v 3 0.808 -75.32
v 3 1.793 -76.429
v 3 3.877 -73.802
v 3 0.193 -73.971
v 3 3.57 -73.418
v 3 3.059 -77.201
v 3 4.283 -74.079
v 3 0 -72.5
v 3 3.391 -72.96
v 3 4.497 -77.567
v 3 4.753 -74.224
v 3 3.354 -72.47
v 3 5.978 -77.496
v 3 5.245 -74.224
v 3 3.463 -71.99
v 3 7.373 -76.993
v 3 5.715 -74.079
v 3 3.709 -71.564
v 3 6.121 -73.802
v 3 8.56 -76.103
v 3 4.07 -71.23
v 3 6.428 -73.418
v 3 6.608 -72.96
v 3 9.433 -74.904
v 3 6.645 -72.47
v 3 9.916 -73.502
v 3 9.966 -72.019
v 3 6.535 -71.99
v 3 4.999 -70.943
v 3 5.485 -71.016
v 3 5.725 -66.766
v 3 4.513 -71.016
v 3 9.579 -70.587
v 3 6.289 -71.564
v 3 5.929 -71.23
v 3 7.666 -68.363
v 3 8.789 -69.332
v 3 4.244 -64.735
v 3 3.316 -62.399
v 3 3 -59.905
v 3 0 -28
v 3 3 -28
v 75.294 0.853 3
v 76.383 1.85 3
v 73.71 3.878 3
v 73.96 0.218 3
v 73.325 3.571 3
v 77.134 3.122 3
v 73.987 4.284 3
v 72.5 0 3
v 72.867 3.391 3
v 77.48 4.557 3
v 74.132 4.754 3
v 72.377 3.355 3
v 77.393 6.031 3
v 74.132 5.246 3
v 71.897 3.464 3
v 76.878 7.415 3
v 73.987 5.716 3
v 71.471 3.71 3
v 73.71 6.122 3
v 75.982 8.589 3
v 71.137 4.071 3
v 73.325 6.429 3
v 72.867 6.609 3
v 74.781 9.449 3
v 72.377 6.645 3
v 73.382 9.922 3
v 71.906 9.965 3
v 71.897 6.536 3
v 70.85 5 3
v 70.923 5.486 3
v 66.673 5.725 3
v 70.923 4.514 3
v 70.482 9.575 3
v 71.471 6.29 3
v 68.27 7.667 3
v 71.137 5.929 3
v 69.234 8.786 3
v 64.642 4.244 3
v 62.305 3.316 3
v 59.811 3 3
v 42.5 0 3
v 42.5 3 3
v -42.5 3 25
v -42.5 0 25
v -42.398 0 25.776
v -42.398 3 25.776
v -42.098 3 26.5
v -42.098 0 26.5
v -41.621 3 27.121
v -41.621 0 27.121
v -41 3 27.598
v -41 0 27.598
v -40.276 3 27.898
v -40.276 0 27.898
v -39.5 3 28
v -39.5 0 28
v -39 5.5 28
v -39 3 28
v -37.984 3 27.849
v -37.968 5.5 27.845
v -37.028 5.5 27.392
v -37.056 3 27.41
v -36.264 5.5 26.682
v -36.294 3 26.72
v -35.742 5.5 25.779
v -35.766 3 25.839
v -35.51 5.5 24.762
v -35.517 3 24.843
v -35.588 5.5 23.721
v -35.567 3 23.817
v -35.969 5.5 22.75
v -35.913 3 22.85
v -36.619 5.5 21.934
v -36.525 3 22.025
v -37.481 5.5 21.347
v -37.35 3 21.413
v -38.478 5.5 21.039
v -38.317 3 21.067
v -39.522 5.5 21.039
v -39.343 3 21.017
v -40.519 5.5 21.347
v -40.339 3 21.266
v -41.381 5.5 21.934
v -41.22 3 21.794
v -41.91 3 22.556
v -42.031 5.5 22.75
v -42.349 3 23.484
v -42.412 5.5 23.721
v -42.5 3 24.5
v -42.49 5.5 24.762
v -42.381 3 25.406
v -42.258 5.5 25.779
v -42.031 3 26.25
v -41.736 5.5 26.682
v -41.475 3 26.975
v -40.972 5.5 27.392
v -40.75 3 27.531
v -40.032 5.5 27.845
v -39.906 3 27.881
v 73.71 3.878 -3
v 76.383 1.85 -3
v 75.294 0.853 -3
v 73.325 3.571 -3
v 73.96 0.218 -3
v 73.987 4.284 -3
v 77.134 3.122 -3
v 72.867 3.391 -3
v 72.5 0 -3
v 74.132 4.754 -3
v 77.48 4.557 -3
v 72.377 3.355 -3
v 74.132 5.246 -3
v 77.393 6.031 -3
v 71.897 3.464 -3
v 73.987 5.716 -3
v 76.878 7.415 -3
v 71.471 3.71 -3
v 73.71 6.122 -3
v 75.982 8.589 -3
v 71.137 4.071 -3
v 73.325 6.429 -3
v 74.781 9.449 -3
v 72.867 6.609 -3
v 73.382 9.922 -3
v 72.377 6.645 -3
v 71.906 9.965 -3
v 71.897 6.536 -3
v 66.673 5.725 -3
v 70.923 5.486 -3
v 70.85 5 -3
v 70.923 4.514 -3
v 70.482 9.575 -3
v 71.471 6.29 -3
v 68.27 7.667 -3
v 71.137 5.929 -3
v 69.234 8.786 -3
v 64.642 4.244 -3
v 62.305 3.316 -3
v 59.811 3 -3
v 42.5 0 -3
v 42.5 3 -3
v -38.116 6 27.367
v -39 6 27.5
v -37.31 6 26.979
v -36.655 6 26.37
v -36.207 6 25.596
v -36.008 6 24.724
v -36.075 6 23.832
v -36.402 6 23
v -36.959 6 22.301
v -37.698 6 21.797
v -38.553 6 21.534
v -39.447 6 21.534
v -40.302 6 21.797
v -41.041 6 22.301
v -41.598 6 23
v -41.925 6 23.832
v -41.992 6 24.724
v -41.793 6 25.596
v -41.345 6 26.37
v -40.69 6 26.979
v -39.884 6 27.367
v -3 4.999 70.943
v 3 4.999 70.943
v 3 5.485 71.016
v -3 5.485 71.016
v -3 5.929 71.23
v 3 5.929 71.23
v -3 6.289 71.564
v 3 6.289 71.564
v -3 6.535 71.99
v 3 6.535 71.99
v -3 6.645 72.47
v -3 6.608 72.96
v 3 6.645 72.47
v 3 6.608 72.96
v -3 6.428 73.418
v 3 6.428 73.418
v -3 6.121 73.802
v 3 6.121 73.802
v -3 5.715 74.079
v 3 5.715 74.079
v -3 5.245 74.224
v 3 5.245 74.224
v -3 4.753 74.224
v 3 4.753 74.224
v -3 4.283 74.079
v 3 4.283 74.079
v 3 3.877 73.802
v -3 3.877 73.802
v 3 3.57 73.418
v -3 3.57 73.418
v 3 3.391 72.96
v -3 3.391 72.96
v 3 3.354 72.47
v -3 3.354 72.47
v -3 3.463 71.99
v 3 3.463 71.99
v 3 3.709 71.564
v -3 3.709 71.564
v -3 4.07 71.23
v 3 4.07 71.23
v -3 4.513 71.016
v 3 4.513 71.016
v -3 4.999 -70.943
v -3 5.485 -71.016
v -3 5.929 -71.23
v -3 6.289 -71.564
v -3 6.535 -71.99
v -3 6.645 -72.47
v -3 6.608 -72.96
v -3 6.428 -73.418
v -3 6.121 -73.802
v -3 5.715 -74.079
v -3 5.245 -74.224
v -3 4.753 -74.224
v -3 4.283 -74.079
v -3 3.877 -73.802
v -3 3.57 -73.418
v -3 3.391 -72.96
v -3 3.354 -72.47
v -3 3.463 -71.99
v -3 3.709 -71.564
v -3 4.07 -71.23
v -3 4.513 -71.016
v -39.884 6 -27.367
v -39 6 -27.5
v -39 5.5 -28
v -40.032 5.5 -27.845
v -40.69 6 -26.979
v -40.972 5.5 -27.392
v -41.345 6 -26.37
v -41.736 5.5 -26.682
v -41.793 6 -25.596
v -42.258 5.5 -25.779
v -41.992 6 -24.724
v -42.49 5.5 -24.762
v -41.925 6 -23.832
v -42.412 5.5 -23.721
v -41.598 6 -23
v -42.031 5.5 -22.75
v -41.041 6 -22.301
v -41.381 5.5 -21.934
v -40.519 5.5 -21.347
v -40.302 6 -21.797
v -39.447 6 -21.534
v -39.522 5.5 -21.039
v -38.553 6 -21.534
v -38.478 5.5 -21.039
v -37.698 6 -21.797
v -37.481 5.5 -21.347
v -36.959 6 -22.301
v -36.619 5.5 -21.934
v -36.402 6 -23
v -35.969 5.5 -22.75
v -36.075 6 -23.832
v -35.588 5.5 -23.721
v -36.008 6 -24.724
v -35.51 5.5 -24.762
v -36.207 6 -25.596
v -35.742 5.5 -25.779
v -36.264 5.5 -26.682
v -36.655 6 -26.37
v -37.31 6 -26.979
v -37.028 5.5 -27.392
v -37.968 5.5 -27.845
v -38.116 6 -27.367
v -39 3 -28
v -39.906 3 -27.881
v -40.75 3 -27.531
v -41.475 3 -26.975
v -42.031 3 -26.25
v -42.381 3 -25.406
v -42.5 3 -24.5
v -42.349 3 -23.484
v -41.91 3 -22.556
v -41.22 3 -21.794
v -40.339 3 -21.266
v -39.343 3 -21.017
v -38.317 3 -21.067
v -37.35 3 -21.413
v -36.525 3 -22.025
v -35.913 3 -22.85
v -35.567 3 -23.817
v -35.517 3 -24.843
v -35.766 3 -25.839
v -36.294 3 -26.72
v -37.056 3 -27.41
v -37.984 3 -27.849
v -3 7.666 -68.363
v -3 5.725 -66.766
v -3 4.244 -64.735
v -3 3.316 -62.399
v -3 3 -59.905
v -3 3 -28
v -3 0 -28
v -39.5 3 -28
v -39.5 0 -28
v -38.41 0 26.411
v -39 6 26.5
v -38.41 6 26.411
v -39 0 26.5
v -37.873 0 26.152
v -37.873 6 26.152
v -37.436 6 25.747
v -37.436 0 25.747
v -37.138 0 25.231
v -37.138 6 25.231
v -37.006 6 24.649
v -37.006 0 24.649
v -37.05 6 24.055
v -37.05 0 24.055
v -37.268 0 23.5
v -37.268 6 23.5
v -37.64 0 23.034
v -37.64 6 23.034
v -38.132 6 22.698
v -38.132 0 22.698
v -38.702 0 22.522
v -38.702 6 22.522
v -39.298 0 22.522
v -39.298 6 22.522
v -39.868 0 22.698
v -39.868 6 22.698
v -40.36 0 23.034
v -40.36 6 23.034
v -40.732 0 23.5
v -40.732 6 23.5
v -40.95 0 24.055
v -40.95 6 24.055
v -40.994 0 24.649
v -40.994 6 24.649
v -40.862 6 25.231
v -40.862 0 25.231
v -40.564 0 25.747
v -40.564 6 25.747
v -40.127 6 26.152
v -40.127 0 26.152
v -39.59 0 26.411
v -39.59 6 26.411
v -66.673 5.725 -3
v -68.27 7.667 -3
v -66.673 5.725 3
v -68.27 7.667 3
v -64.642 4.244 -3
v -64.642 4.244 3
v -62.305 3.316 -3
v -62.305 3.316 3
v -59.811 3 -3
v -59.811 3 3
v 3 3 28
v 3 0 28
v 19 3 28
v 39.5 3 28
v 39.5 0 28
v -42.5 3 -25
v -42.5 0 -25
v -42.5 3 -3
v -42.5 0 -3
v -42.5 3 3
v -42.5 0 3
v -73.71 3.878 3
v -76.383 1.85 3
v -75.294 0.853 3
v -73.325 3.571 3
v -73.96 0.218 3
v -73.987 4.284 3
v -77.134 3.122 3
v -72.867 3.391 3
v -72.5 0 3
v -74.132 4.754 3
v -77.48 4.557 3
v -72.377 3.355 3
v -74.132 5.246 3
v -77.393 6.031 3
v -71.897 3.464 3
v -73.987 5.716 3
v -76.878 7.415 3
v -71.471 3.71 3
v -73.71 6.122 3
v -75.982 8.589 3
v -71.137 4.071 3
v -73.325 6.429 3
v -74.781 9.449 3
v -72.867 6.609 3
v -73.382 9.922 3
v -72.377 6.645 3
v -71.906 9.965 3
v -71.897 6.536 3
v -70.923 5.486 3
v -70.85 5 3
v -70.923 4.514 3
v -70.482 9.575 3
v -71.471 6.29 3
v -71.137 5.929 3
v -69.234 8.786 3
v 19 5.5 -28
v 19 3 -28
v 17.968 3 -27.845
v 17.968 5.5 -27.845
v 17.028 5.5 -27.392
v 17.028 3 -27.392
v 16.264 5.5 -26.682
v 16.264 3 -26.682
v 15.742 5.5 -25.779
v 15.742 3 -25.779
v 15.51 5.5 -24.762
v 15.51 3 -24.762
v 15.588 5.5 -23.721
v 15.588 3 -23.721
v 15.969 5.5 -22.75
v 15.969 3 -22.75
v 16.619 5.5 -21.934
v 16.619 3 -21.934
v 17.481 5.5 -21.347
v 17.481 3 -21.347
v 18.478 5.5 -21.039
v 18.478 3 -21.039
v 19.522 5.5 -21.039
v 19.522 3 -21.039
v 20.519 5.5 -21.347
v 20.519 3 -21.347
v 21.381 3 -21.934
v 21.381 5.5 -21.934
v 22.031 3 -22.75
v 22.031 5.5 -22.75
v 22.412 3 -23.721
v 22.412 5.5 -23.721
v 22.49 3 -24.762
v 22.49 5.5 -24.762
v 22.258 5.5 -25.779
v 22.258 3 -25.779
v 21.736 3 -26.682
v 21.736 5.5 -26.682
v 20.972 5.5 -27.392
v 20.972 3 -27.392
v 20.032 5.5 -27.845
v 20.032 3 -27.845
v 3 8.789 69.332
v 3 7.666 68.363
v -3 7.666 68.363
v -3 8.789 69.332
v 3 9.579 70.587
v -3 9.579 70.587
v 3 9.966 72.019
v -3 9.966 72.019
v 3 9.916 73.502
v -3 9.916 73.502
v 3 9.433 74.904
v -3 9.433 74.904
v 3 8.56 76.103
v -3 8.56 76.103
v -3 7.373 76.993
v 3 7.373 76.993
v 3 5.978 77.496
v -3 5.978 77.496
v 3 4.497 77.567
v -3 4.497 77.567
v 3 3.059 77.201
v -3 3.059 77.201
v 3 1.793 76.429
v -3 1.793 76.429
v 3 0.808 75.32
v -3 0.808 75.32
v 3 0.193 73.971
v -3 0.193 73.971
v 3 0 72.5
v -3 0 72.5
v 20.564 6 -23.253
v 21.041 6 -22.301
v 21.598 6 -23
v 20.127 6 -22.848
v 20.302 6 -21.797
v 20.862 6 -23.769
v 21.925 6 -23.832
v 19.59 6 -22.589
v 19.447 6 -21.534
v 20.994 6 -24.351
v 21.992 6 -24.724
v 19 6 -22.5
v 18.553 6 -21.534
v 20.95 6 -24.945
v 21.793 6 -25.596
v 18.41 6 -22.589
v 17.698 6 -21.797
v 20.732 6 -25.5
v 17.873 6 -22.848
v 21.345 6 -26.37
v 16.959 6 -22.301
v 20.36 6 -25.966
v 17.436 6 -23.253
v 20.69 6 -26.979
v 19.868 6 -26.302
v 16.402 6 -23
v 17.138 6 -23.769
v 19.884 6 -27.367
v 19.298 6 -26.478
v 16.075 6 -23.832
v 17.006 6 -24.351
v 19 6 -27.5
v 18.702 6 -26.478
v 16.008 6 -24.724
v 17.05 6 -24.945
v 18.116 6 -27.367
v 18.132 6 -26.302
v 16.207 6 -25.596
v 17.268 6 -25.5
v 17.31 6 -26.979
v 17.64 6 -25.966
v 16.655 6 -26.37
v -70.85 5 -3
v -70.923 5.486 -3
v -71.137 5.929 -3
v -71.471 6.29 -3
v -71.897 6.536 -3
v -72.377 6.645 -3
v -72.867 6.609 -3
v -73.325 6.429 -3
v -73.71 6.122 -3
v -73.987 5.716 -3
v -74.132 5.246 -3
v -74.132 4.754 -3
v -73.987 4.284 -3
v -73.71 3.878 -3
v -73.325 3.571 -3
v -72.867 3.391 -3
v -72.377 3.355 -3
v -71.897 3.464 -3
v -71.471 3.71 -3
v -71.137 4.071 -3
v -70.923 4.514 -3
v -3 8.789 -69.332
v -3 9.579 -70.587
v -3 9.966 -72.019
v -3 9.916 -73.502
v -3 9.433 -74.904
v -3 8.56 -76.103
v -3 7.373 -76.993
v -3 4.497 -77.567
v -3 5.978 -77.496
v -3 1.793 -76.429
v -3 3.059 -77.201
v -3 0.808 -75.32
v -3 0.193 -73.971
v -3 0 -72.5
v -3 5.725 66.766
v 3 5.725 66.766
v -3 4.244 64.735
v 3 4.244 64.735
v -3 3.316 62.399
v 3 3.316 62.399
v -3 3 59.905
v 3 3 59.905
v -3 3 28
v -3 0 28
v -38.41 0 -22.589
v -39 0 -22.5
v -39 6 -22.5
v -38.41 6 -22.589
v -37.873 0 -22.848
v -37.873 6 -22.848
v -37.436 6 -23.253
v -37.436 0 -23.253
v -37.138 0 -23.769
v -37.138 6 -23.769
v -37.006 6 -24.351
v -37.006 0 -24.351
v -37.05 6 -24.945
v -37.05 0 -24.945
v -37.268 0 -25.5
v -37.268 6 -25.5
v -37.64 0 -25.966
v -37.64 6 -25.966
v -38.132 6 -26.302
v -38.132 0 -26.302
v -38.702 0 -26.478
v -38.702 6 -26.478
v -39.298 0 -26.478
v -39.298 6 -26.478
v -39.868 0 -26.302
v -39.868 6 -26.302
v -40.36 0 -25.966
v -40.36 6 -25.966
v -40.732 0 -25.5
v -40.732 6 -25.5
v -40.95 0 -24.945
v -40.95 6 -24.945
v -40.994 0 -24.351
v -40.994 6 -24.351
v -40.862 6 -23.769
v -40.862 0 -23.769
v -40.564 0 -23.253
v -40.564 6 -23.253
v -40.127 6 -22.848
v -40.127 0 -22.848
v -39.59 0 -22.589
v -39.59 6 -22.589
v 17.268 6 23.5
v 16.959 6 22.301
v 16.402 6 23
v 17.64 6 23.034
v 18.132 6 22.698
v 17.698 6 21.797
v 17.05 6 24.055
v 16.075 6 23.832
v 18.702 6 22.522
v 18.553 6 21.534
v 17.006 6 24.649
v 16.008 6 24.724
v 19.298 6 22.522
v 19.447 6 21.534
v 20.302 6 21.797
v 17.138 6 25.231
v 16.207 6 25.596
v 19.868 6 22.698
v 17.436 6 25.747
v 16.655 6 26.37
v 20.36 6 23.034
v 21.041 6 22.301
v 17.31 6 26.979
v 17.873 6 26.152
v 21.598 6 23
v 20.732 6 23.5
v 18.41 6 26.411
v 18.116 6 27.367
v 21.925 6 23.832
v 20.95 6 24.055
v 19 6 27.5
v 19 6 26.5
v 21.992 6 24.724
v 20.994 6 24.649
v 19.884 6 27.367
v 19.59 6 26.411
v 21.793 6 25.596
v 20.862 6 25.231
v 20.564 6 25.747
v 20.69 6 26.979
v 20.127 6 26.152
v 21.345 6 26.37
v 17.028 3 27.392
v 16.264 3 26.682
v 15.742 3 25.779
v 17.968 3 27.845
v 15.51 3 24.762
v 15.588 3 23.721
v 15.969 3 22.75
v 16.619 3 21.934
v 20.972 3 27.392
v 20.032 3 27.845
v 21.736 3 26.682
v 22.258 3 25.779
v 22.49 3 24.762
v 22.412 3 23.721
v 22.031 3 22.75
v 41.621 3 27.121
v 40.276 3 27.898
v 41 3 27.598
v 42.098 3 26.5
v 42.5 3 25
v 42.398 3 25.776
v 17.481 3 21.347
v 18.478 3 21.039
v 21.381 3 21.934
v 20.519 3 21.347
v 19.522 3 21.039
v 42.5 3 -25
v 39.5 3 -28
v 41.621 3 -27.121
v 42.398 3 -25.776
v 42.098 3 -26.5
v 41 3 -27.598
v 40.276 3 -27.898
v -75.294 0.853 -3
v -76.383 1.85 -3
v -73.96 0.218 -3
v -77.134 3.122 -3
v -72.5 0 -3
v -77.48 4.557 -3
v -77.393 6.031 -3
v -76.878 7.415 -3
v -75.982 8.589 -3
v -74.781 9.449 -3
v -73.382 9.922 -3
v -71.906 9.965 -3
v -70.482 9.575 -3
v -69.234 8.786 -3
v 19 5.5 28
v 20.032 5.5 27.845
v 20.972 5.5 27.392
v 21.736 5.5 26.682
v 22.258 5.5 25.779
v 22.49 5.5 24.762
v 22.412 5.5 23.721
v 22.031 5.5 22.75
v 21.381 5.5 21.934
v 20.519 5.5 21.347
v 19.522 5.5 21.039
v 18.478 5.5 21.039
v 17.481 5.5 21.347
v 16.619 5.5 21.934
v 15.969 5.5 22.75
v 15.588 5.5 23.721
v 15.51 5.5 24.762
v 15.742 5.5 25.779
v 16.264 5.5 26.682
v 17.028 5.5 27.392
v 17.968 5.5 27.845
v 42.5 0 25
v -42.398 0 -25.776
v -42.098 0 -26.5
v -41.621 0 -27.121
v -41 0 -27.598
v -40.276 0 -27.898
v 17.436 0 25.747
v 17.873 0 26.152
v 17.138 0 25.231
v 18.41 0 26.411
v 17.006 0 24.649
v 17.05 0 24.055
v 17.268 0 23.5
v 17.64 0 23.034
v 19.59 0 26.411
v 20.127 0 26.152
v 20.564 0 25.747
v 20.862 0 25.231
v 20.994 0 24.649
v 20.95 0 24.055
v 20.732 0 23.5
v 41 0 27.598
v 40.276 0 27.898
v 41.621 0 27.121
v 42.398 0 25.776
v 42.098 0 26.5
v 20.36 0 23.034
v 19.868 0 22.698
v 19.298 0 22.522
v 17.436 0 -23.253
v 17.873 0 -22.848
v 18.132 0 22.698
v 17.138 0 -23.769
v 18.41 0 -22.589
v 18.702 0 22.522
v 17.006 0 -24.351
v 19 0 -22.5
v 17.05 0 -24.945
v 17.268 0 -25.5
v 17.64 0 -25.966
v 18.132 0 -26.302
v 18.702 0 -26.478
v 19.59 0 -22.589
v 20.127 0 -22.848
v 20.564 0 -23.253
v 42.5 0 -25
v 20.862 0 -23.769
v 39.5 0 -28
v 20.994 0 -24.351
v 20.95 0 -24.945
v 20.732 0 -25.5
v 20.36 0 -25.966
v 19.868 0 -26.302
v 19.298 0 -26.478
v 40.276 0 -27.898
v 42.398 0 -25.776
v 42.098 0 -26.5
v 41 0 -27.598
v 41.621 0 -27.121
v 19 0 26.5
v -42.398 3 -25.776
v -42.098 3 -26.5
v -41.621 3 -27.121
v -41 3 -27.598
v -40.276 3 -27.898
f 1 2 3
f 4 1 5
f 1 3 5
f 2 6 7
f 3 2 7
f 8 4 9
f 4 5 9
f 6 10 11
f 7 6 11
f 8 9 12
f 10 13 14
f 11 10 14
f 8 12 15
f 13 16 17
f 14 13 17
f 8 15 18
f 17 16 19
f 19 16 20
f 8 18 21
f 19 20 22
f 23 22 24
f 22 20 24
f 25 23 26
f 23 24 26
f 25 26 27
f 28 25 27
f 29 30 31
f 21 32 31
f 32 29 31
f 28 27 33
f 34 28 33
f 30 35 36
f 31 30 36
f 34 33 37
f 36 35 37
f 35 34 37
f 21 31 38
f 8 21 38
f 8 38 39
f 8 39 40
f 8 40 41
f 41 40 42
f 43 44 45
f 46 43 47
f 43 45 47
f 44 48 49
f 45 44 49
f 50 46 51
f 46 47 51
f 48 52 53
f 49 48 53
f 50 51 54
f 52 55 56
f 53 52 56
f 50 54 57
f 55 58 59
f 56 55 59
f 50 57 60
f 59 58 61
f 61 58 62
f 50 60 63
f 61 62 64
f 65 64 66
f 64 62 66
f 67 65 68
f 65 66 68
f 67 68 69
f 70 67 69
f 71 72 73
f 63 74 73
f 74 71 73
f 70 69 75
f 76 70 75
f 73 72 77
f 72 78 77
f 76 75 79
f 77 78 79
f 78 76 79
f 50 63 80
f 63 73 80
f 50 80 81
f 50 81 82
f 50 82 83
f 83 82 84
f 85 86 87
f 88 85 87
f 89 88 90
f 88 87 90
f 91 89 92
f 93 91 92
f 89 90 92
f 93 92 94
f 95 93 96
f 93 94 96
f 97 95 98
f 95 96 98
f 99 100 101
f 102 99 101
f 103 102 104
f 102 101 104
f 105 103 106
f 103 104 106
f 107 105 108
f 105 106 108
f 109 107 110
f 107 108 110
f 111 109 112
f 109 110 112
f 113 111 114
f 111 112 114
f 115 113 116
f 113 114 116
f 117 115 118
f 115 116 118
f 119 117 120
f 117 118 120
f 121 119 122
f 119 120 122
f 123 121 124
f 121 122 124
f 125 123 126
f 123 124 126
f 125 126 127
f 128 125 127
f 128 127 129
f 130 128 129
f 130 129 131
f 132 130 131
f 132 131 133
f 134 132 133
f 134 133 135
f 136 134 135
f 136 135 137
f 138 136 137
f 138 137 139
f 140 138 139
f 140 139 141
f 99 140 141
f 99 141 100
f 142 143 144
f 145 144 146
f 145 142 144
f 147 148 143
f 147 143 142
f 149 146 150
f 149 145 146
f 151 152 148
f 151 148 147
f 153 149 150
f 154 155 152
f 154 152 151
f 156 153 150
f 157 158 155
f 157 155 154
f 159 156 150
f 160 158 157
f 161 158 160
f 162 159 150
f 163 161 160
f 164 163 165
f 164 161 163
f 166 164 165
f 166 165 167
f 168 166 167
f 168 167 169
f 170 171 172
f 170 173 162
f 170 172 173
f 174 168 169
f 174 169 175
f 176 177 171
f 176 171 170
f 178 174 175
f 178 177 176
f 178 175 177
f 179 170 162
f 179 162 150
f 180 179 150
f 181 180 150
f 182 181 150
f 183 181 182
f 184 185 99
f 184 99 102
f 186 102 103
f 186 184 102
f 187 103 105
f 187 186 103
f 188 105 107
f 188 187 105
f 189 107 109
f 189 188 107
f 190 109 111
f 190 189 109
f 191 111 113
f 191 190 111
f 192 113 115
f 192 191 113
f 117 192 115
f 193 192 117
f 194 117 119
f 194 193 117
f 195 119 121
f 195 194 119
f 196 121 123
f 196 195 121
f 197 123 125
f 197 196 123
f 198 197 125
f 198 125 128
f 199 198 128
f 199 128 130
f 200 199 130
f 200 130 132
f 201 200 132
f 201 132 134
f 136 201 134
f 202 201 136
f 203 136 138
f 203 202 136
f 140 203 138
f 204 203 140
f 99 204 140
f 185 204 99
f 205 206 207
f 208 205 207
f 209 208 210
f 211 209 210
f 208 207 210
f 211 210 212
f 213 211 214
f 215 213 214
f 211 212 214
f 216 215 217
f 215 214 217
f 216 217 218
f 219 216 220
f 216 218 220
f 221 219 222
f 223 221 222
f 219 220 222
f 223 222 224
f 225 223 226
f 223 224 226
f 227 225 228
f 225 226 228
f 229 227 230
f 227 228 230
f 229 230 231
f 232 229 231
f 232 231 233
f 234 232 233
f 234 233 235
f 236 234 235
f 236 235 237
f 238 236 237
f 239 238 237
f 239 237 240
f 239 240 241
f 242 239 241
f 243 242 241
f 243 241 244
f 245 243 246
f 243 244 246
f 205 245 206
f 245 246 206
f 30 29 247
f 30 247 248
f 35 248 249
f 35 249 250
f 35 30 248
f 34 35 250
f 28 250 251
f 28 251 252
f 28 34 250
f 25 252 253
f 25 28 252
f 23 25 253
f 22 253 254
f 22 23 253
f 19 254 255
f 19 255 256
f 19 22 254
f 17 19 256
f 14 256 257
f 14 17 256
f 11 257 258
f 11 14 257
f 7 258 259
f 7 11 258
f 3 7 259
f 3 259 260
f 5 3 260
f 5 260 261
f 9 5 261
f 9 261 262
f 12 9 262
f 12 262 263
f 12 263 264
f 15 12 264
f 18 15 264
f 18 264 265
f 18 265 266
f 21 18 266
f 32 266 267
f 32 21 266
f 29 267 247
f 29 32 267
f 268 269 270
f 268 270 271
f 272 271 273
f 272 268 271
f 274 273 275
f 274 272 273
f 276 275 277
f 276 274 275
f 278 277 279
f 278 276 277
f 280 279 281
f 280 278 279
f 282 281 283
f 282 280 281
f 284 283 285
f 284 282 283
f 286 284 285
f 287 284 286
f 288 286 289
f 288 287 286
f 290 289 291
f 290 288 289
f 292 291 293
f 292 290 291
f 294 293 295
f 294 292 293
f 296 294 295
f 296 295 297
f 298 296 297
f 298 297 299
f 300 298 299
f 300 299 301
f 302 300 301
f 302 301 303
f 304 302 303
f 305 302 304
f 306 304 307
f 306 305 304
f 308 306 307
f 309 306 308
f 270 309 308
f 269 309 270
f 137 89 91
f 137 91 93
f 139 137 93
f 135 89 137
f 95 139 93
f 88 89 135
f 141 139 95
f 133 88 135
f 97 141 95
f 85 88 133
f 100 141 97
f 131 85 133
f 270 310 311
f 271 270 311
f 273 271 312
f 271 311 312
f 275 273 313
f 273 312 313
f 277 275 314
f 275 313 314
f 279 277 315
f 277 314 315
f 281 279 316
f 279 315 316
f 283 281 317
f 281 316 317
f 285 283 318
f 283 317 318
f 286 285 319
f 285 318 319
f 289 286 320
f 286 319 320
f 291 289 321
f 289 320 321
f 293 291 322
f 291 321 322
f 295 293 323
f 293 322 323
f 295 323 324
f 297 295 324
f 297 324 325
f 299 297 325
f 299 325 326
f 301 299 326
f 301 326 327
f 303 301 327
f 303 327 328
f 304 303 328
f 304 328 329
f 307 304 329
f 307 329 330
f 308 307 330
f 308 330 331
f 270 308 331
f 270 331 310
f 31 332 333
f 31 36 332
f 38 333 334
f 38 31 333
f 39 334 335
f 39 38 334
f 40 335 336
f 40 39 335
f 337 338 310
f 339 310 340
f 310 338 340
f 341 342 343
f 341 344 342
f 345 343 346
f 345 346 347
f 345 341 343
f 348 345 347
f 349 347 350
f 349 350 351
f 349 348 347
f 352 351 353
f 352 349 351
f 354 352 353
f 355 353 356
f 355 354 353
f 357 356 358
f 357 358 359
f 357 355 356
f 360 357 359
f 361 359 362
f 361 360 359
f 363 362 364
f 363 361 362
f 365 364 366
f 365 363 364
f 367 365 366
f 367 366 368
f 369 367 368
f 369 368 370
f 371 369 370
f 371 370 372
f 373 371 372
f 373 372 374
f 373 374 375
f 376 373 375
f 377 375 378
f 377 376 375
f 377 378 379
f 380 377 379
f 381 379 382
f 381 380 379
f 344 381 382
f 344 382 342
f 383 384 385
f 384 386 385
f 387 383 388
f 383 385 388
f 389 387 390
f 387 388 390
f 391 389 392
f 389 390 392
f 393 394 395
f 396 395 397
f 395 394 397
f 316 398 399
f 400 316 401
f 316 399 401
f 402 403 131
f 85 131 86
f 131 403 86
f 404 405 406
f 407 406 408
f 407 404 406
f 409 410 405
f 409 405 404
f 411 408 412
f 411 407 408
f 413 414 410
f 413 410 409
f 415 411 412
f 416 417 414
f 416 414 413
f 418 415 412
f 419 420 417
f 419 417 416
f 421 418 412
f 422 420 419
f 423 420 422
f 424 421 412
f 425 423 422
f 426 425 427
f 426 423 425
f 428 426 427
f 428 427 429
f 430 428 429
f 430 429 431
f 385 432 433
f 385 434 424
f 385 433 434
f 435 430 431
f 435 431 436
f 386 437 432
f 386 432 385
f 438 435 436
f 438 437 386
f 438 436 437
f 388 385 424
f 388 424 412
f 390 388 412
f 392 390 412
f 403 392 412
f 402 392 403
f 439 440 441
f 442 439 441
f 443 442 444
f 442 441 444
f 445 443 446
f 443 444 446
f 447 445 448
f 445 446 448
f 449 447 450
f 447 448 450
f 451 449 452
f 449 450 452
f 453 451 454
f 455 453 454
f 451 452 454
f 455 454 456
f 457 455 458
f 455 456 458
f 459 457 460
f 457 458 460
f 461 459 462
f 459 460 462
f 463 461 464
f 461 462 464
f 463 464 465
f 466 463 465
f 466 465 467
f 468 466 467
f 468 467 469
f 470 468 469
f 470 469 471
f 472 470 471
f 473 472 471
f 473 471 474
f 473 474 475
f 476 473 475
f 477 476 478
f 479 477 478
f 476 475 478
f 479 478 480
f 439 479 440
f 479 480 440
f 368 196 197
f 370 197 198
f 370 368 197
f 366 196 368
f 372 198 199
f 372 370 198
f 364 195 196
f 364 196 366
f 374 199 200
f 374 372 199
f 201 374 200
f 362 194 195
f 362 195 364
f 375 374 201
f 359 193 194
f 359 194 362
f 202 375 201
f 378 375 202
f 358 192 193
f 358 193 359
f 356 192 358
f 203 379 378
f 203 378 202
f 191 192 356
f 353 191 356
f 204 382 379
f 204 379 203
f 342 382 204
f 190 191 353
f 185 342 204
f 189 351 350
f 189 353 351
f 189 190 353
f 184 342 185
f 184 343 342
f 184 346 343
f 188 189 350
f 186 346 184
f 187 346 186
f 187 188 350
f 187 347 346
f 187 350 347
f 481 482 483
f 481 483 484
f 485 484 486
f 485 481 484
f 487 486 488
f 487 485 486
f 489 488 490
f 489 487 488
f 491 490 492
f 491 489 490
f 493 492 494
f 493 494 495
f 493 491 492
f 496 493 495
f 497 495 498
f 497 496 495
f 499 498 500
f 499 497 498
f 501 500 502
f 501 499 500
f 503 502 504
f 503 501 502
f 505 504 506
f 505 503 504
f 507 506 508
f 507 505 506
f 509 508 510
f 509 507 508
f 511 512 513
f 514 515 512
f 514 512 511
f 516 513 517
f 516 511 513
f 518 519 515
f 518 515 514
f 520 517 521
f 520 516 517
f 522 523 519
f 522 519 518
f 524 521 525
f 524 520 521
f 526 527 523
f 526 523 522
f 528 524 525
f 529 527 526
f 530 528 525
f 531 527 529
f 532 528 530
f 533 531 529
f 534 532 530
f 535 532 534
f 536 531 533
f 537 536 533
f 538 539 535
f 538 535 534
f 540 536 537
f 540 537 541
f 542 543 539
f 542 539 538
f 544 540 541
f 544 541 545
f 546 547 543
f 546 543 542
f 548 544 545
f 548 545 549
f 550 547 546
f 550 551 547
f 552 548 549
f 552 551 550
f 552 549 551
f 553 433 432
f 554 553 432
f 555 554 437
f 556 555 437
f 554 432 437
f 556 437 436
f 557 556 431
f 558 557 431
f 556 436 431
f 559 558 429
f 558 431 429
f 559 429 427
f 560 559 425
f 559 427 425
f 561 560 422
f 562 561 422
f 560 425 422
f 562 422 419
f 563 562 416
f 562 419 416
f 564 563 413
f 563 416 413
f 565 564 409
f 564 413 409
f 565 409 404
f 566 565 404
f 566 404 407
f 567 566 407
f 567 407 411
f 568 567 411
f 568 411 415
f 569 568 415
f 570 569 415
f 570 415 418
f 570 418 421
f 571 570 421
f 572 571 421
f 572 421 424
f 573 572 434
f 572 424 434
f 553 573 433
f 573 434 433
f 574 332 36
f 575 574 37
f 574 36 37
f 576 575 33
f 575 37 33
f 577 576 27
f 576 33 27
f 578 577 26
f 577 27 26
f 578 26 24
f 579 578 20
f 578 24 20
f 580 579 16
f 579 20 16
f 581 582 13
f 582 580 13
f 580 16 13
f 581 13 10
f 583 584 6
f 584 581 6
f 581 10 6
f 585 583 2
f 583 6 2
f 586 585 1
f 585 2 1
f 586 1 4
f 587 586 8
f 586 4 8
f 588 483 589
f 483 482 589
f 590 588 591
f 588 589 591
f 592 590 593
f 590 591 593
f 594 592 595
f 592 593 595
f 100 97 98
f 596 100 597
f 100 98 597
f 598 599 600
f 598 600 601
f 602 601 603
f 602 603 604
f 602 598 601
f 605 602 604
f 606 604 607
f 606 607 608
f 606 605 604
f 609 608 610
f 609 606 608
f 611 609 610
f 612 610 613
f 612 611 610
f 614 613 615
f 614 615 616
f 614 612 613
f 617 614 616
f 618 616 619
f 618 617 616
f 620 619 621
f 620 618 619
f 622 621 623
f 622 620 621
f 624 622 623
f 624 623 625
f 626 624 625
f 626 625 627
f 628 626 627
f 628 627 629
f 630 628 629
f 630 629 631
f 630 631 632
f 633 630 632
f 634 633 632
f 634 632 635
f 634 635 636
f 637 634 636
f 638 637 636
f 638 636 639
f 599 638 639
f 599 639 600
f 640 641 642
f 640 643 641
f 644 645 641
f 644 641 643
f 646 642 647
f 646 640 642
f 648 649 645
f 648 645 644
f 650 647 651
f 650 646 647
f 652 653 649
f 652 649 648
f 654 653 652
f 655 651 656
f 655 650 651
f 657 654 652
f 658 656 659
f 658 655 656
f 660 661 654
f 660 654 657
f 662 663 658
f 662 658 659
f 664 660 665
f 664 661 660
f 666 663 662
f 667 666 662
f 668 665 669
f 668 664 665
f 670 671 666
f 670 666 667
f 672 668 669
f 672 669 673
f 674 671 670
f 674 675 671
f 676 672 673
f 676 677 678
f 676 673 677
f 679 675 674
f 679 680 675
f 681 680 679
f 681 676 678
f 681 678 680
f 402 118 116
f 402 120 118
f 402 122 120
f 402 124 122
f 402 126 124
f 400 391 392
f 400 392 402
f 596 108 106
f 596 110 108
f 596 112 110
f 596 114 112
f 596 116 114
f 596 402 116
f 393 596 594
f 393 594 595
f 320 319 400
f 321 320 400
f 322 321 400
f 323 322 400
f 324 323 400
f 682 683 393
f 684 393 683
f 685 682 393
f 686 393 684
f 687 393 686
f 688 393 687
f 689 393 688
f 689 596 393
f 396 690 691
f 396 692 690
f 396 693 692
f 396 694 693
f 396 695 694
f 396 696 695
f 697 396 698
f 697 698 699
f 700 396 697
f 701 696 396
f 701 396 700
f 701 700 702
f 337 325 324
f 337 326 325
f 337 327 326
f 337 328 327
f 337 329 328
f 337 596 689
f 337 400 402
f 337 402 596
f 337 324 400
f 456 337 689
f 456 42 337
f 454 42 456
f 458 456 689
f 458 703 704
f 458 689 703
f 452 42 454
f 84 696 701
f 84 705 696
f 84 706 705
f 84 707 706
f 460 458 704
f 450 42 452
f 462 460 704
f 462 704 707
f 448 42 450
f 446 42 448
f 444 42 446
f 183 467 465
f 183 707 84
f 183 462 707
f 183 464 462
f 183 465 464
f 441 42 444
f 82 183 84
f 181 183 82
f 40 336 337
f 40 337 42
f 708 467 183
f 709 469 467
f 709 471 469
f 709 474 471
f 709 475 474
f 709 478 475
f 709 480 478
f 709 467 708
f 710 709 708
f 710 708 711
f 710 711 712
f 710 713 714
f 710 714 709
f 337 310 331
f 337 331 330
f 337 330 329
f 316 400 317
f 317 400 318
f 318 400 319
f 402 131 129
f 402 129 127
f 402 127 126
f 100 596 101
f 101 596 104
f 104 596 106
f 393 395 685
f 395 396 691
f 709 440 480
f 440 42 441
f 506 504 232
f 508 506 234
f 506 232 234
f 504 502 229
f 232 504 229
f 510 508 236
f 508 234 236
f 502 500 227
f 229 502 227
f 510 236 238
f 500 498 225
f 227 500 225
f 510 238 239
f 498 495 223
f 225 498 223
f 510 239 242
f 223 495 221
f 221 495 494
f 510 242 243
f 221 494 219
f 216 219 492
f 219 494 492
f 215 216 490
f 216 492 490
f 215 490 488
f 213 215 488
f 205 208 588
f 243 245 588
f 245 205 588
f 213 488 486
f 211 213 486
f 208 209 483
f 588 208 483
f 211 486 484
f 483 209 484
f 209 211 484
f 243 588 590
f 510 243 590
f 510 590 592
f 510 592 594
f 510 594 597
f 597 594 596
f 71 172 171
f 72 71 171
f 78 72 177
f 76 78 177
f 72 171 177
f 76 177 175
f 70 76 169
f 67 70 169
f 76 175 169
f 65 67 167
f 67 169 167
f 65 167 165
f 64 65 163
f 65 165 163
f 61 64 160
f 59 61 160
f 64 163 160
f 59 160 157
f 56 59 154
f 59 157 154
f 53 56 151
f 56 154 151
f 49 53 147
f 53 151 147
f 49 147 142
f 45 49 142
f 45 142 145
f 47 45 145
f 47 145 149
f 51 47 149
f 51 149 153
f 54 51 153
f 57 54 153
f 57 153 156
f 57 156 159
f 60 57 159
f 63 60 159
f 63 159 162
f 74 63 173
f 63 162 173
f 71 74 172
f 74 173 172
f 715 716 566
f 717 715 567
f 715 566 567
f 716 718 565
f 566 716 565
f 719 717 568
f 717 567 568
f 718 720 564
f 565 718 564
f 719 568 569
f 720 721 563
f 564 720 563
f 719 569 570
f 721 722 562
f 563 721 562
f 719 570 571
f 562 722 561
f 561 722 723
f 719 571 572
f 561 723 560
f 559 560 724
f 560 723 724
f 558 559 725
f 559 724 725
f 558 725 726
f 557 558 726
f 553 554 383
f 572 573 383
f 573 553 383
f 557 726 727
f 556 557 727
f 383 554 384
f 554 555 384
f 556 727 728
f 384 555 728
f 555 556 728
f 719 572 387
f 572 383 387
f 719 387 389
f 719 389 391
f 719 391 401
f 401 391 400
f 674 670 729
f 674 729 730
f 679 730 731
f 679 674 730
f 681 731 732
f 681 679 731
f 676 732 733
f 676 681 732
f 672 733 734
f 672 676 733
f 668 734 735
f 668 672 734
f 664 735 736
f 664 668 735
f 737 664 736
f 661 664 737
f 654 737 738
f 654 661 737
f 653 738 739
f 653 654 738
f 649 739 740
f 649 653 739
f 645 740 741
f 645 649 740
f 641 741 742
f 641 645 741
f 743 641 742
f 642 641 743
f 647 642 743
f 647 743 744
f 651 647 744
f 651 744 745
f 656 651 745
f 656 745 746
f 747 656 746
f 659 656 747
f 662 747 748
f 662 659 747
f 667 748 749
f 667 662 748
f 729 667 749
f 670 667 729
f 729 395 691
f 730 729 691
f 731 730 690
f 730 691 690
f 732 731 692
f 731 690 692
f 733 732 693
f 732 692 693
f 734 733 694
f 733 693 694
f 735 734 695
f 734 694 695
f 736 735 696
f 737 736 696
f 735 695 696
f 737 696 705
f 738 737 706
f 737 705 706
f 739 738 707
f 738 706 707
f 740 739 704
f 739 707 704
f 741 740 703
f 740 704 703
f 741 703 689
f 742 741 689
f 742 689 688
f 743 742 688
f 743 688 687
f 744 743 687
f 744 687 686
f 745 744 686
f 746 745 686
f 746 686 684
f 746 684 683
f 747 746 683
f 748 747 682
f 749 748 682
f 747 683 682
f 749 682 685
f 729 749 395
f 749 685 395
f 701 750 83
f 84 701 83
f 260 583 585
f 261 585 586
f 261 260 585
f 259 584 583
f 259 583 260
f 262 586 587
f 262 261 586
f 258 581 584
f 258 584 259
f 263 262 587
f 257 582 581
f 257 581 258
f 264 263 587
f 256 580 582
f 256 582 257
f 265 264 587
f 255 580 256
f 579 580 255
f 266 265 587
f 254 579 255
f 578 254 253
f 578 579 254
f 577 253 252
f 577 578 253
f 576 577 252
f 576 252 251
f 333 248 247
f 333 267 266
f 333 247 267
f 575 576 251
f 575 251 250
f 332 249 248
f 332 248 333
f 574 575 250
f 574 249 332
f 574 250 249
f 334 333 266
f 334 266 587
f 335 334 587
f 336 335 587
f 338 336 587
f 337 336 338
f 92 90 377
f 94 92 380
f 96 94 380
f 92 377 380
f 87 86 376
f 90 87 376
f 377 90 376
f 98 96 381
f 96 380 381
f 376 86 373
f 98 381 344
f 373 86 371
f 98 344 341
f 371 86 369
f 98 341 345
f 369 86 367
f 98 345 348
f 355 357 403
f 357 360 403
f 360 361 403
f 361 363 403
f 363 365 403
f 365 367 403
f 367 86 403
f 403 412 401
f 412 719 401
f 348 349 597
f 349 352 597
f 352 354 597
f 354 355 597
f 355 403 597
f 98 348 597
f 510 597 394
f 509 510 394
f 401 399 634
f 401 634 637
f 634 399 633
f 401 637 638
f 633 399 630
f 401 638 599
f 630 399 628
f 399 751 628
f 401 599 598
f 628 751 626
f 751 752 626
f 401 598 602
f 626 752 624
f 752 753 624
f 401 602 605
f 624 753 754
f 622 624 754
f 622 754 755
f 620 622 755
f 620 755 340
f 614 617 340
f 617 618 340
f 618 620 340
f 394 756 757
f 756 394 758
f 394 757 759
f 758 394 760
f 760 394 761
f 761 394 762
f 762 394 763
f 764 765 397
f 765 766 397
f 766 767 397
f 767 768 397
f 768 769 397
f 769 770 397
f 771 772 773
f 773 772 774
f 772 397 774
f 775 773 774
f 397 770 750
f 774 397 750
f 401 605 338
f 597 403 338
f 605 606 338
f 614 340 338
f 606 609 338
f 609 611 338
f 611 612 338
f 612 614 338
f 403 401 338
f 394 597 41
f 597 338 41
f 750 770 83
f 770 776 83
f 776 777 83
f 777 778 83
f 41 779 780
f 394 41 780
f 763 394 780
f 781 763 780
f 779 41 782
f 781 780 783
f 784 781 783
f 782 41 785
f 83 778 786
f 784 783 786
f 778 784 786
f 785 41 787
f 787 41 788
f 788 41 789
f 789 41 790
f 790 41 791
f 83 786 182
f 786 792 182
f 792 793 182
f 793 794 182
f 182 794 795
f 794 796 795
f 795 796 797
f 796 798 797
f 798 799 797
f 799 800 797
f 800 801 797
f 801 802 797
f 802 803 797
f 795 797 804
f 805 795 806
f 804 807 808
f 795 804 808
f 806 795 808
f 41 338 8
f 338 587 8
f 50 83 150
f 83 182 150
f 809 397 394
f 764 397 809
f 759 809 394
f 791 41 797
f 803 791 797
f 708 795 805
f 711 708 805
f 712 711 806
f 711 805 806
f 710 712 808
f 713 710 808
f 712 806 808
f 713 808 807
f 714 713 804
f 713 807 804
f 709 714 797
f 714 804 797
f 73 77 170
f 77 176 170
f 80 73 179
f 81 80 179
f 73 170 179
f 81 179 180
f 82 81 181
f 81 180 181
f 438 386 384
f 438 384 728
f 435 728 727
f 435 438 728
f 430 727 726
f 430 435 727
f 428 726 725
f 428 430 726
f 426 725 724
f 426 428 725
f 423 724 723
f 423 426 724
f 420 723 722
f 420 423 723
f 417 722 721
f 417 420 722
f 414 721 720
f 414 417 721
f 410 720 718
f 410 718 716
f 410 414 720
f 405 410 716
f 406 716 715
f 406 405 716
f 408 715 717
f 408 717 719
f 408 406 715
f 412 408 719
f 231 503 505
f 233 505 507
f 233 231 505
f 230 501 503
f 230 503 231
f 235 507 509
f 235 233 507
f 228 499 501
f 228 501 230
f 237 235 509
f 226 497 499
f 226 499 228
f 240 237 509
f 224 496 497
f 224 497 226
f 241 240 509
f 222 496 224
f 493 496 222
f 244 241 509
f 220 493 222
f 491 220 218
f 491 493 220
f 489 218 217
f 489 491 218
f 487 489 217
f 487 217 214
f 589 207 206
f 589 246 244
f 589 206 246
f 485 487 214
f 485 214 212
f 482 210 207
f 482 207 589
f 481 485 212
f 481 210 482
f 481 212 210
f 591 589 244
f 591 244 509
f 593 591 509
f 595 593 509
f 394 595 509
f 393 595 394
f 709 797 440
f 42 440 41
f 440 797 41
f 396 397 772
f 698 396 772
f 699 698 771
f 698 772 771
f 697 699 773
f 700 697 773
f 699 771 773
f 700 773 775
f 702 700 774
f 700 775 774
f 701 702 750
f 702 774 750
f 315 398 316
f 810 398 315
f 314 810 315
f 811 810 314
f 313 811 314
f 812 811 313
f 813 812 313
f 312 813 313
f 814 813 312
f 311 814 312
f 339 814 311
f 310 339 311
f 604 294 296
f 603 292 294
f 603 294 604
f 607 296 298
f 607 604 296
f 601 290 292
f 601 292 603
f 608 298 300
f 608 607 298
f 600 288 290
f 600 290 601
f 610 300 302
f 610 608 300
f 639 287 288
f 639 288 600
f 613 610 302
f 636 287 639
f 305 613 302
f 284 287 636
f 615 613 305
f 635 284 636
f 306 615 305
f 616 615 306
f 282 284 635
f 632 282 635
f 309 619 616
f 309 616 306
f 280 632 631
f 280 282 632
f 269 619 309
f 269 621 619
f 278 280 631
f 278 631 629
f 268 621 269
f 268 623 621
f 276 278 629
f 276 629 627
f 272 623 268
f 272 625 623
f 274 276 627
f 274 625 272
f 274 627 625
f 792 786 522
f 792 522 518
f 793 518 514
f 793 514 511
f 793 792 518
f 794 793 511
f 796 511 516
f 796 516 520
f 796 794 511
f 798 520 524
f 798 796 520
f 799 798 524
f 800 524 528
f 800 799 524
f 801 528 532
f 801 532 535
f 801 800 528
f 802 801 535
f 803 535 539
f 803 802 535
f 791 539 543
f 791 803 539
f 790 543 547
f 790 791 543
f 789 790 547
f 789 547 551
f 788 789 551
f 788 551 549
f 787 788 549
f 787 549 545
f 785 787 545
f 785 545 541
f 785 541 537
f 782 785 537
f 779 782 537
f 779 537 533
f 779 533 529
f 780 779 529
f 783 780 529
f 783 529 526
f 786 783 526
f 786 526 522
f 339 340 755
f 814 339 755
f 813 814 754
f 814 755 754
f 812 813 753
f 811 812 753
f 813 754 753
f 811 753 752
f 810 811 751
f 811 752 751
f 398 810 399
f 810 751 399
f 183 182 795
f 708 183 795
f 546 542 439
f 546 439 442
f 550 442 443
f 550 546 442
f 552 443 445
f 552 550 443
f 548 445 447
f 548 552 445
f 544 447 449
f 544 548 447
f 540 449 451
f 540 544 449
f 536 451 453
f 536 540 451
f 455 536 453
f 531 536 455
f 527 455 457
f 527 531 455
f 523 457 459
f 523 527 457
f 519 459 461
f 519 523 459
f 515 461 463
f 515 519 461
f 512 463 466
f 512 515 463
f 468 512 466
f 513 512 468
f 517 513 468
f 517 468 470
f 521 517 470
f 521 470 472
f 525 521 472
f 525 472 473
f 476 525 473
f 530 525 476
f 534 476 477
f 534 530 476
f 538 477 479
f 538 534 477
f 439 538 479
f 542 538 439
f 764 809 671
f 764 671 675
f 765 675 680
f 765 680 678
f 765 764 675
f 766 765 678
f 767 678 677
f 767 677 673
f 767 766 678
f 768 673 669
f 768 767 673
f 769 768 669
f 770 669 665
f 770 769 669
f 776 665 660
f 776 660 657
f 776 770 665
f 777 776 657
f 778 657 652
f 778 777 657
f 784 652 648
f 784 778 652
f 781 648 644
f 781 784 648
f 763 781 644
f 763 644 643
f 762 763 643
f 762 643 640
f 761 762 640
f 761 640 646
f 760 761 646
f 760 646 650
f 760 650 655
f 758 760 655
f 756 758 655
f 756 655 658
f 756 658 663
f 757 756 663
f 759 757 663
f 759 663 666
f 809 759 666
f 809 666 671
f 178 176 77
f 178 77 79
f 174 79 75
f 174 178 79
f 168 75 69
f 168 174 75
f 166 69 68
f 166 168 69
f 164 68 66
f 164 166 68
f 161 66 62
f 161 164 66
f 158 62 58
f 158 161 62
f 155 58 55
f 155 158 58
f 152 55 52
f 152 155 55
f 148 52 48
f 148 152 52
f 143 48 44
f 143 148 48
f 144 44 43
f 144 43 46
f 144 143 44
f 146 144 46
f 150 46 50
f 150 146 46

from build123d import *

# Parameters (mm, degrees)
SKETCH1_R                = 2
BOSS_EXTRUDE1_DEPTH      = 3
BOSS_EXTRUDE3_DEPTH      = 3
SKETCH2_R                = 3.5
SKETCH2_R_2              = 2
BOSS_EXTRUDE2_DEPTH      = 3
SKETCH4_R                = 5
SKETCH4_R_2              = 1.65
BOSS_EXTRUDE4_DEPTH      = 6
FILLET1_R                = 10
SKETCH6_R                = 5
SKETCH6_R_2              = 1.65
BOSS_EXTRUDE5_DEPTH      = 6
FILLET2_R                = 10
CIRPATTERN4_COUNT        = 2
FILLET1_OF_CIRPATTERN4_R = 10
FILLET2_OF_MIRROR1_R     = 10
CHAMFER1_SIZE            = 0.5


with BuildPart() as part:
    # Sketch1 → Boss-Extrude1 (new body)
    with BuildSketch(Plane(origin=(0, 0, 0), x_dir=(1, 0, 0), z_dir=(0, 1, 0))):
        with BuildLine():
            Line((-39.5, -28), (39.5, -28))
            ThreePointArc((39.5, -28), (41.621320344, -27.121320344), (42.5, -25))
            Line((42.5, -25), (42.5, 25))
            ThreePointArc((42.5, 25), (41.621320344, 27.121320344), (39.5, 28))
            Line((39.5, 28), (-39.5, 28))
            ThreePointArc((-39.5, 28), (-41.621320344, 27.121320344), (-42.5, 25))
            Line((-42.5, 25), (-42.5, -25))
            ThreePointArc((-42.5, -25), (-41.621320344, -27.121320344), (-39.5, -28))
        make_face()
        with Locations(Location((-39, -24.5, 0), (0, 0, 270))):
            Circle(SKETCH1_R, mode=Mode.SUBTRACT)
        with Locations(Location((-39, 24.5, 0), (0, 0, 270))):
            Circle(SKETCH1_R, mode=Mode.SUBTRACT)
        with Locations(Location((19, 24.5, 0), (0, 0, 270))):
            Circle(SKETCH1_R, mode=Mode.SUBTRACT)
        with Locations(Location((19, -24.5, 0), (0, 0, 270))):
            Circle(SKETCH1_R, mode=Mode.SUBTRACT)
    extrude(amount=BOSS_EXTRUDE1_DEPTH)

    # Sketch3 → Boss-Extrude3 (add)
    with BuildSketch(Plane(origin=(0, 3, 0), x_dir=(1, 0, 0), z_dir=(0, 1, 0))):
        Polygon((-3, 3), (-72.5, 3), (-72.5, -3), (-3, -3), (-3, -72.5), (3, -72.5), (3, -3), (72.5, -3), (72.5, 3), (3, 3), (3, 72.5), (-3, 72.5), align=None)
    boss_extrude3 = extrude(amount=-BOSS_EXTRUDE3_DEPTH)

    # Sketch2 → Boss-Extrude2 (add)
    # profile 1 of 4: a face of its own
    with BuildSketch(Plane(origin=(0, 3, 0), x_dir=(1, 0, 0), z_dir=(0, 1, 0))):
        with Locations(Location((-39, -24.5, 0), (0, 0, 270))):
            Circle(SKETCH2_R)
        with Locations(Location((-39, -24.5, 0), (0, 0, 270))):
            Circle(SKETCH2_R_2, mode=Mode.SUBTRACT)
    # profile 2 of 4: a face of its own
    with BuildSketch(Plane(origin=(0, 3, 0), x_dir=(1, 0, 0), z_dir=(0, 1, 0))):
        with Locations(Location((-39, 24.5, 0), (0, 0, 90))):
            Circle(SKETCH2_R)
        with Locations(Location((-39, 24.5, 0), (0, 0, 270))):
            Circle(SKETCH2_R_2, mode=Mode.SUBTRACT)
    # profile 3 of 4: a face of its own
    with BuildSketch(Plane(origin=(0, 3, 0), x_dir=(1, 0, 0), z_dir=(0, 1, 0))):
        with Locations(Location((19, 24.5, 0), (0, 0, 90))):
            Circle(SKETCH2_R)
        with Locations(Location((19, 24.5, 0), (0, 0, 270))):
            Circle(SKETCH2_R_2, mode=Mode.SUBTRACT)
    # profile 4 of 4: a face of its own
    with BuildSketch(Plane(origin=(0, 3, 0), x_dir=(1, 0, 0), z_dir=(0, 1, 0))):
        with Locations(Location((19, -24.5, 0), (0, 0, 270))):
            Circle(SKETCH2_R)
        with Locations(Location((19, -24.5, 0), (0, 0, 270))):
            Circle(SKETCH2_R_2, mode=Mode.SUBTRACT)
    extrude(amount=BOSS_EXTRUDE2_DEPTH)

    # Sketch4 → Boss-Extrude4 (add)
    with BuildSketch(Plane.XY.offset(3)):
        with Locations((-72.5, 5)):
            Circle(SKETCH4_R)
        with Locations((-72.5, 5)):
            Circle(SKETCH4_R_2, mode=Mode.SUBTRACT)
    boss_extrude4 = extrude(amount=-BOSS_EXTRUDE4_DEPTH)

    # Fillet1
    fillet1_edges = [part.edges().sort_by_distance(p)[0] for p in [
        (-67.917424305, 3, 0),
    ]]
    fillet(fillet1_edges, radius=FILLET1_R)

    # Sketch6 → Boss-Extrude5 (add)
    with BuildSketch(Plane(origin=(3, 0, 0), x_dir=(0, 0, -1), z_dir=(1, 0, 0))):
        with Locations((-72.592807544, 4.999138602)):
            Circle(SKETCH6_R)
        with Locations((-72.592807544, 4.999138602)):
            Circle(SKETCH6_R_2, mode=Mode.SUBTRACT)
    boss_extrude5 = extrude(amount=-BOSS_EXTRUDE5_DEPTH)

    # Fillet2
    fillet2_edges = [part.edges().sort_by_distance(p)[0] for p in [
        (0, 3, 68.009856001),
    ]]
    fillet(fillet2_edges, radius=FILLET2_R)

    # CirPattern4: Boss-Extrude3, Boss-Extrude4 ×2 about axis
    cirpattern4_axis = Axis((0, 0, 0), (0, 1, 0))
    add([boss_extrude3.rotate(cirpattern4_axis, i * 360 / CIRPATTERN4_COUNT) for i in range(1, CIRPATTERN4_COUNT)])
    add([boss_extrude4.rotate(cirpattern4_axis, i * 360 / CIRPATTERN4_COUNT) for i in range(1, CIRPATTERN4_COUNT)])

    # Fillet1 of CirPattern4
    fillet1_of_cirpattern4_edges = [part.edges().sort_by_distance(p)[0] for p in [
        (67.917424305, 3, 0),
    ]]
    fillet(fillet1_of_cirpattern4_edges, radius=FILLET1_OF_CIRPATTERN4_R)

    # Mirror1: Boss-Extrude5 across plane
    add(boss_extrude5.mirror(Plane.XY))

    # Fillet2 of Mirror1
    fillet2_of_mirror1_edges = [part.edges().sort_by_distance(p)[0] for p in [
        (0, 3, -68.009856001),
    ]]
    fillet(fillet2_of_mirror1_edges, radius=FILLET2_OF_MIRROR1_R)

    # Chamfer1
    chamfer1_edges = [part.edges().sort_by_distance(p)[0] for p in [
        (-39, 6, 21),
        (-39, 6, -21),
        (19, 6, -21),
        (19, 6, 21),
    ]]
    chamfer(chamfer1_edges, length=CHAMFER1_SIZE)


solid = part.part
